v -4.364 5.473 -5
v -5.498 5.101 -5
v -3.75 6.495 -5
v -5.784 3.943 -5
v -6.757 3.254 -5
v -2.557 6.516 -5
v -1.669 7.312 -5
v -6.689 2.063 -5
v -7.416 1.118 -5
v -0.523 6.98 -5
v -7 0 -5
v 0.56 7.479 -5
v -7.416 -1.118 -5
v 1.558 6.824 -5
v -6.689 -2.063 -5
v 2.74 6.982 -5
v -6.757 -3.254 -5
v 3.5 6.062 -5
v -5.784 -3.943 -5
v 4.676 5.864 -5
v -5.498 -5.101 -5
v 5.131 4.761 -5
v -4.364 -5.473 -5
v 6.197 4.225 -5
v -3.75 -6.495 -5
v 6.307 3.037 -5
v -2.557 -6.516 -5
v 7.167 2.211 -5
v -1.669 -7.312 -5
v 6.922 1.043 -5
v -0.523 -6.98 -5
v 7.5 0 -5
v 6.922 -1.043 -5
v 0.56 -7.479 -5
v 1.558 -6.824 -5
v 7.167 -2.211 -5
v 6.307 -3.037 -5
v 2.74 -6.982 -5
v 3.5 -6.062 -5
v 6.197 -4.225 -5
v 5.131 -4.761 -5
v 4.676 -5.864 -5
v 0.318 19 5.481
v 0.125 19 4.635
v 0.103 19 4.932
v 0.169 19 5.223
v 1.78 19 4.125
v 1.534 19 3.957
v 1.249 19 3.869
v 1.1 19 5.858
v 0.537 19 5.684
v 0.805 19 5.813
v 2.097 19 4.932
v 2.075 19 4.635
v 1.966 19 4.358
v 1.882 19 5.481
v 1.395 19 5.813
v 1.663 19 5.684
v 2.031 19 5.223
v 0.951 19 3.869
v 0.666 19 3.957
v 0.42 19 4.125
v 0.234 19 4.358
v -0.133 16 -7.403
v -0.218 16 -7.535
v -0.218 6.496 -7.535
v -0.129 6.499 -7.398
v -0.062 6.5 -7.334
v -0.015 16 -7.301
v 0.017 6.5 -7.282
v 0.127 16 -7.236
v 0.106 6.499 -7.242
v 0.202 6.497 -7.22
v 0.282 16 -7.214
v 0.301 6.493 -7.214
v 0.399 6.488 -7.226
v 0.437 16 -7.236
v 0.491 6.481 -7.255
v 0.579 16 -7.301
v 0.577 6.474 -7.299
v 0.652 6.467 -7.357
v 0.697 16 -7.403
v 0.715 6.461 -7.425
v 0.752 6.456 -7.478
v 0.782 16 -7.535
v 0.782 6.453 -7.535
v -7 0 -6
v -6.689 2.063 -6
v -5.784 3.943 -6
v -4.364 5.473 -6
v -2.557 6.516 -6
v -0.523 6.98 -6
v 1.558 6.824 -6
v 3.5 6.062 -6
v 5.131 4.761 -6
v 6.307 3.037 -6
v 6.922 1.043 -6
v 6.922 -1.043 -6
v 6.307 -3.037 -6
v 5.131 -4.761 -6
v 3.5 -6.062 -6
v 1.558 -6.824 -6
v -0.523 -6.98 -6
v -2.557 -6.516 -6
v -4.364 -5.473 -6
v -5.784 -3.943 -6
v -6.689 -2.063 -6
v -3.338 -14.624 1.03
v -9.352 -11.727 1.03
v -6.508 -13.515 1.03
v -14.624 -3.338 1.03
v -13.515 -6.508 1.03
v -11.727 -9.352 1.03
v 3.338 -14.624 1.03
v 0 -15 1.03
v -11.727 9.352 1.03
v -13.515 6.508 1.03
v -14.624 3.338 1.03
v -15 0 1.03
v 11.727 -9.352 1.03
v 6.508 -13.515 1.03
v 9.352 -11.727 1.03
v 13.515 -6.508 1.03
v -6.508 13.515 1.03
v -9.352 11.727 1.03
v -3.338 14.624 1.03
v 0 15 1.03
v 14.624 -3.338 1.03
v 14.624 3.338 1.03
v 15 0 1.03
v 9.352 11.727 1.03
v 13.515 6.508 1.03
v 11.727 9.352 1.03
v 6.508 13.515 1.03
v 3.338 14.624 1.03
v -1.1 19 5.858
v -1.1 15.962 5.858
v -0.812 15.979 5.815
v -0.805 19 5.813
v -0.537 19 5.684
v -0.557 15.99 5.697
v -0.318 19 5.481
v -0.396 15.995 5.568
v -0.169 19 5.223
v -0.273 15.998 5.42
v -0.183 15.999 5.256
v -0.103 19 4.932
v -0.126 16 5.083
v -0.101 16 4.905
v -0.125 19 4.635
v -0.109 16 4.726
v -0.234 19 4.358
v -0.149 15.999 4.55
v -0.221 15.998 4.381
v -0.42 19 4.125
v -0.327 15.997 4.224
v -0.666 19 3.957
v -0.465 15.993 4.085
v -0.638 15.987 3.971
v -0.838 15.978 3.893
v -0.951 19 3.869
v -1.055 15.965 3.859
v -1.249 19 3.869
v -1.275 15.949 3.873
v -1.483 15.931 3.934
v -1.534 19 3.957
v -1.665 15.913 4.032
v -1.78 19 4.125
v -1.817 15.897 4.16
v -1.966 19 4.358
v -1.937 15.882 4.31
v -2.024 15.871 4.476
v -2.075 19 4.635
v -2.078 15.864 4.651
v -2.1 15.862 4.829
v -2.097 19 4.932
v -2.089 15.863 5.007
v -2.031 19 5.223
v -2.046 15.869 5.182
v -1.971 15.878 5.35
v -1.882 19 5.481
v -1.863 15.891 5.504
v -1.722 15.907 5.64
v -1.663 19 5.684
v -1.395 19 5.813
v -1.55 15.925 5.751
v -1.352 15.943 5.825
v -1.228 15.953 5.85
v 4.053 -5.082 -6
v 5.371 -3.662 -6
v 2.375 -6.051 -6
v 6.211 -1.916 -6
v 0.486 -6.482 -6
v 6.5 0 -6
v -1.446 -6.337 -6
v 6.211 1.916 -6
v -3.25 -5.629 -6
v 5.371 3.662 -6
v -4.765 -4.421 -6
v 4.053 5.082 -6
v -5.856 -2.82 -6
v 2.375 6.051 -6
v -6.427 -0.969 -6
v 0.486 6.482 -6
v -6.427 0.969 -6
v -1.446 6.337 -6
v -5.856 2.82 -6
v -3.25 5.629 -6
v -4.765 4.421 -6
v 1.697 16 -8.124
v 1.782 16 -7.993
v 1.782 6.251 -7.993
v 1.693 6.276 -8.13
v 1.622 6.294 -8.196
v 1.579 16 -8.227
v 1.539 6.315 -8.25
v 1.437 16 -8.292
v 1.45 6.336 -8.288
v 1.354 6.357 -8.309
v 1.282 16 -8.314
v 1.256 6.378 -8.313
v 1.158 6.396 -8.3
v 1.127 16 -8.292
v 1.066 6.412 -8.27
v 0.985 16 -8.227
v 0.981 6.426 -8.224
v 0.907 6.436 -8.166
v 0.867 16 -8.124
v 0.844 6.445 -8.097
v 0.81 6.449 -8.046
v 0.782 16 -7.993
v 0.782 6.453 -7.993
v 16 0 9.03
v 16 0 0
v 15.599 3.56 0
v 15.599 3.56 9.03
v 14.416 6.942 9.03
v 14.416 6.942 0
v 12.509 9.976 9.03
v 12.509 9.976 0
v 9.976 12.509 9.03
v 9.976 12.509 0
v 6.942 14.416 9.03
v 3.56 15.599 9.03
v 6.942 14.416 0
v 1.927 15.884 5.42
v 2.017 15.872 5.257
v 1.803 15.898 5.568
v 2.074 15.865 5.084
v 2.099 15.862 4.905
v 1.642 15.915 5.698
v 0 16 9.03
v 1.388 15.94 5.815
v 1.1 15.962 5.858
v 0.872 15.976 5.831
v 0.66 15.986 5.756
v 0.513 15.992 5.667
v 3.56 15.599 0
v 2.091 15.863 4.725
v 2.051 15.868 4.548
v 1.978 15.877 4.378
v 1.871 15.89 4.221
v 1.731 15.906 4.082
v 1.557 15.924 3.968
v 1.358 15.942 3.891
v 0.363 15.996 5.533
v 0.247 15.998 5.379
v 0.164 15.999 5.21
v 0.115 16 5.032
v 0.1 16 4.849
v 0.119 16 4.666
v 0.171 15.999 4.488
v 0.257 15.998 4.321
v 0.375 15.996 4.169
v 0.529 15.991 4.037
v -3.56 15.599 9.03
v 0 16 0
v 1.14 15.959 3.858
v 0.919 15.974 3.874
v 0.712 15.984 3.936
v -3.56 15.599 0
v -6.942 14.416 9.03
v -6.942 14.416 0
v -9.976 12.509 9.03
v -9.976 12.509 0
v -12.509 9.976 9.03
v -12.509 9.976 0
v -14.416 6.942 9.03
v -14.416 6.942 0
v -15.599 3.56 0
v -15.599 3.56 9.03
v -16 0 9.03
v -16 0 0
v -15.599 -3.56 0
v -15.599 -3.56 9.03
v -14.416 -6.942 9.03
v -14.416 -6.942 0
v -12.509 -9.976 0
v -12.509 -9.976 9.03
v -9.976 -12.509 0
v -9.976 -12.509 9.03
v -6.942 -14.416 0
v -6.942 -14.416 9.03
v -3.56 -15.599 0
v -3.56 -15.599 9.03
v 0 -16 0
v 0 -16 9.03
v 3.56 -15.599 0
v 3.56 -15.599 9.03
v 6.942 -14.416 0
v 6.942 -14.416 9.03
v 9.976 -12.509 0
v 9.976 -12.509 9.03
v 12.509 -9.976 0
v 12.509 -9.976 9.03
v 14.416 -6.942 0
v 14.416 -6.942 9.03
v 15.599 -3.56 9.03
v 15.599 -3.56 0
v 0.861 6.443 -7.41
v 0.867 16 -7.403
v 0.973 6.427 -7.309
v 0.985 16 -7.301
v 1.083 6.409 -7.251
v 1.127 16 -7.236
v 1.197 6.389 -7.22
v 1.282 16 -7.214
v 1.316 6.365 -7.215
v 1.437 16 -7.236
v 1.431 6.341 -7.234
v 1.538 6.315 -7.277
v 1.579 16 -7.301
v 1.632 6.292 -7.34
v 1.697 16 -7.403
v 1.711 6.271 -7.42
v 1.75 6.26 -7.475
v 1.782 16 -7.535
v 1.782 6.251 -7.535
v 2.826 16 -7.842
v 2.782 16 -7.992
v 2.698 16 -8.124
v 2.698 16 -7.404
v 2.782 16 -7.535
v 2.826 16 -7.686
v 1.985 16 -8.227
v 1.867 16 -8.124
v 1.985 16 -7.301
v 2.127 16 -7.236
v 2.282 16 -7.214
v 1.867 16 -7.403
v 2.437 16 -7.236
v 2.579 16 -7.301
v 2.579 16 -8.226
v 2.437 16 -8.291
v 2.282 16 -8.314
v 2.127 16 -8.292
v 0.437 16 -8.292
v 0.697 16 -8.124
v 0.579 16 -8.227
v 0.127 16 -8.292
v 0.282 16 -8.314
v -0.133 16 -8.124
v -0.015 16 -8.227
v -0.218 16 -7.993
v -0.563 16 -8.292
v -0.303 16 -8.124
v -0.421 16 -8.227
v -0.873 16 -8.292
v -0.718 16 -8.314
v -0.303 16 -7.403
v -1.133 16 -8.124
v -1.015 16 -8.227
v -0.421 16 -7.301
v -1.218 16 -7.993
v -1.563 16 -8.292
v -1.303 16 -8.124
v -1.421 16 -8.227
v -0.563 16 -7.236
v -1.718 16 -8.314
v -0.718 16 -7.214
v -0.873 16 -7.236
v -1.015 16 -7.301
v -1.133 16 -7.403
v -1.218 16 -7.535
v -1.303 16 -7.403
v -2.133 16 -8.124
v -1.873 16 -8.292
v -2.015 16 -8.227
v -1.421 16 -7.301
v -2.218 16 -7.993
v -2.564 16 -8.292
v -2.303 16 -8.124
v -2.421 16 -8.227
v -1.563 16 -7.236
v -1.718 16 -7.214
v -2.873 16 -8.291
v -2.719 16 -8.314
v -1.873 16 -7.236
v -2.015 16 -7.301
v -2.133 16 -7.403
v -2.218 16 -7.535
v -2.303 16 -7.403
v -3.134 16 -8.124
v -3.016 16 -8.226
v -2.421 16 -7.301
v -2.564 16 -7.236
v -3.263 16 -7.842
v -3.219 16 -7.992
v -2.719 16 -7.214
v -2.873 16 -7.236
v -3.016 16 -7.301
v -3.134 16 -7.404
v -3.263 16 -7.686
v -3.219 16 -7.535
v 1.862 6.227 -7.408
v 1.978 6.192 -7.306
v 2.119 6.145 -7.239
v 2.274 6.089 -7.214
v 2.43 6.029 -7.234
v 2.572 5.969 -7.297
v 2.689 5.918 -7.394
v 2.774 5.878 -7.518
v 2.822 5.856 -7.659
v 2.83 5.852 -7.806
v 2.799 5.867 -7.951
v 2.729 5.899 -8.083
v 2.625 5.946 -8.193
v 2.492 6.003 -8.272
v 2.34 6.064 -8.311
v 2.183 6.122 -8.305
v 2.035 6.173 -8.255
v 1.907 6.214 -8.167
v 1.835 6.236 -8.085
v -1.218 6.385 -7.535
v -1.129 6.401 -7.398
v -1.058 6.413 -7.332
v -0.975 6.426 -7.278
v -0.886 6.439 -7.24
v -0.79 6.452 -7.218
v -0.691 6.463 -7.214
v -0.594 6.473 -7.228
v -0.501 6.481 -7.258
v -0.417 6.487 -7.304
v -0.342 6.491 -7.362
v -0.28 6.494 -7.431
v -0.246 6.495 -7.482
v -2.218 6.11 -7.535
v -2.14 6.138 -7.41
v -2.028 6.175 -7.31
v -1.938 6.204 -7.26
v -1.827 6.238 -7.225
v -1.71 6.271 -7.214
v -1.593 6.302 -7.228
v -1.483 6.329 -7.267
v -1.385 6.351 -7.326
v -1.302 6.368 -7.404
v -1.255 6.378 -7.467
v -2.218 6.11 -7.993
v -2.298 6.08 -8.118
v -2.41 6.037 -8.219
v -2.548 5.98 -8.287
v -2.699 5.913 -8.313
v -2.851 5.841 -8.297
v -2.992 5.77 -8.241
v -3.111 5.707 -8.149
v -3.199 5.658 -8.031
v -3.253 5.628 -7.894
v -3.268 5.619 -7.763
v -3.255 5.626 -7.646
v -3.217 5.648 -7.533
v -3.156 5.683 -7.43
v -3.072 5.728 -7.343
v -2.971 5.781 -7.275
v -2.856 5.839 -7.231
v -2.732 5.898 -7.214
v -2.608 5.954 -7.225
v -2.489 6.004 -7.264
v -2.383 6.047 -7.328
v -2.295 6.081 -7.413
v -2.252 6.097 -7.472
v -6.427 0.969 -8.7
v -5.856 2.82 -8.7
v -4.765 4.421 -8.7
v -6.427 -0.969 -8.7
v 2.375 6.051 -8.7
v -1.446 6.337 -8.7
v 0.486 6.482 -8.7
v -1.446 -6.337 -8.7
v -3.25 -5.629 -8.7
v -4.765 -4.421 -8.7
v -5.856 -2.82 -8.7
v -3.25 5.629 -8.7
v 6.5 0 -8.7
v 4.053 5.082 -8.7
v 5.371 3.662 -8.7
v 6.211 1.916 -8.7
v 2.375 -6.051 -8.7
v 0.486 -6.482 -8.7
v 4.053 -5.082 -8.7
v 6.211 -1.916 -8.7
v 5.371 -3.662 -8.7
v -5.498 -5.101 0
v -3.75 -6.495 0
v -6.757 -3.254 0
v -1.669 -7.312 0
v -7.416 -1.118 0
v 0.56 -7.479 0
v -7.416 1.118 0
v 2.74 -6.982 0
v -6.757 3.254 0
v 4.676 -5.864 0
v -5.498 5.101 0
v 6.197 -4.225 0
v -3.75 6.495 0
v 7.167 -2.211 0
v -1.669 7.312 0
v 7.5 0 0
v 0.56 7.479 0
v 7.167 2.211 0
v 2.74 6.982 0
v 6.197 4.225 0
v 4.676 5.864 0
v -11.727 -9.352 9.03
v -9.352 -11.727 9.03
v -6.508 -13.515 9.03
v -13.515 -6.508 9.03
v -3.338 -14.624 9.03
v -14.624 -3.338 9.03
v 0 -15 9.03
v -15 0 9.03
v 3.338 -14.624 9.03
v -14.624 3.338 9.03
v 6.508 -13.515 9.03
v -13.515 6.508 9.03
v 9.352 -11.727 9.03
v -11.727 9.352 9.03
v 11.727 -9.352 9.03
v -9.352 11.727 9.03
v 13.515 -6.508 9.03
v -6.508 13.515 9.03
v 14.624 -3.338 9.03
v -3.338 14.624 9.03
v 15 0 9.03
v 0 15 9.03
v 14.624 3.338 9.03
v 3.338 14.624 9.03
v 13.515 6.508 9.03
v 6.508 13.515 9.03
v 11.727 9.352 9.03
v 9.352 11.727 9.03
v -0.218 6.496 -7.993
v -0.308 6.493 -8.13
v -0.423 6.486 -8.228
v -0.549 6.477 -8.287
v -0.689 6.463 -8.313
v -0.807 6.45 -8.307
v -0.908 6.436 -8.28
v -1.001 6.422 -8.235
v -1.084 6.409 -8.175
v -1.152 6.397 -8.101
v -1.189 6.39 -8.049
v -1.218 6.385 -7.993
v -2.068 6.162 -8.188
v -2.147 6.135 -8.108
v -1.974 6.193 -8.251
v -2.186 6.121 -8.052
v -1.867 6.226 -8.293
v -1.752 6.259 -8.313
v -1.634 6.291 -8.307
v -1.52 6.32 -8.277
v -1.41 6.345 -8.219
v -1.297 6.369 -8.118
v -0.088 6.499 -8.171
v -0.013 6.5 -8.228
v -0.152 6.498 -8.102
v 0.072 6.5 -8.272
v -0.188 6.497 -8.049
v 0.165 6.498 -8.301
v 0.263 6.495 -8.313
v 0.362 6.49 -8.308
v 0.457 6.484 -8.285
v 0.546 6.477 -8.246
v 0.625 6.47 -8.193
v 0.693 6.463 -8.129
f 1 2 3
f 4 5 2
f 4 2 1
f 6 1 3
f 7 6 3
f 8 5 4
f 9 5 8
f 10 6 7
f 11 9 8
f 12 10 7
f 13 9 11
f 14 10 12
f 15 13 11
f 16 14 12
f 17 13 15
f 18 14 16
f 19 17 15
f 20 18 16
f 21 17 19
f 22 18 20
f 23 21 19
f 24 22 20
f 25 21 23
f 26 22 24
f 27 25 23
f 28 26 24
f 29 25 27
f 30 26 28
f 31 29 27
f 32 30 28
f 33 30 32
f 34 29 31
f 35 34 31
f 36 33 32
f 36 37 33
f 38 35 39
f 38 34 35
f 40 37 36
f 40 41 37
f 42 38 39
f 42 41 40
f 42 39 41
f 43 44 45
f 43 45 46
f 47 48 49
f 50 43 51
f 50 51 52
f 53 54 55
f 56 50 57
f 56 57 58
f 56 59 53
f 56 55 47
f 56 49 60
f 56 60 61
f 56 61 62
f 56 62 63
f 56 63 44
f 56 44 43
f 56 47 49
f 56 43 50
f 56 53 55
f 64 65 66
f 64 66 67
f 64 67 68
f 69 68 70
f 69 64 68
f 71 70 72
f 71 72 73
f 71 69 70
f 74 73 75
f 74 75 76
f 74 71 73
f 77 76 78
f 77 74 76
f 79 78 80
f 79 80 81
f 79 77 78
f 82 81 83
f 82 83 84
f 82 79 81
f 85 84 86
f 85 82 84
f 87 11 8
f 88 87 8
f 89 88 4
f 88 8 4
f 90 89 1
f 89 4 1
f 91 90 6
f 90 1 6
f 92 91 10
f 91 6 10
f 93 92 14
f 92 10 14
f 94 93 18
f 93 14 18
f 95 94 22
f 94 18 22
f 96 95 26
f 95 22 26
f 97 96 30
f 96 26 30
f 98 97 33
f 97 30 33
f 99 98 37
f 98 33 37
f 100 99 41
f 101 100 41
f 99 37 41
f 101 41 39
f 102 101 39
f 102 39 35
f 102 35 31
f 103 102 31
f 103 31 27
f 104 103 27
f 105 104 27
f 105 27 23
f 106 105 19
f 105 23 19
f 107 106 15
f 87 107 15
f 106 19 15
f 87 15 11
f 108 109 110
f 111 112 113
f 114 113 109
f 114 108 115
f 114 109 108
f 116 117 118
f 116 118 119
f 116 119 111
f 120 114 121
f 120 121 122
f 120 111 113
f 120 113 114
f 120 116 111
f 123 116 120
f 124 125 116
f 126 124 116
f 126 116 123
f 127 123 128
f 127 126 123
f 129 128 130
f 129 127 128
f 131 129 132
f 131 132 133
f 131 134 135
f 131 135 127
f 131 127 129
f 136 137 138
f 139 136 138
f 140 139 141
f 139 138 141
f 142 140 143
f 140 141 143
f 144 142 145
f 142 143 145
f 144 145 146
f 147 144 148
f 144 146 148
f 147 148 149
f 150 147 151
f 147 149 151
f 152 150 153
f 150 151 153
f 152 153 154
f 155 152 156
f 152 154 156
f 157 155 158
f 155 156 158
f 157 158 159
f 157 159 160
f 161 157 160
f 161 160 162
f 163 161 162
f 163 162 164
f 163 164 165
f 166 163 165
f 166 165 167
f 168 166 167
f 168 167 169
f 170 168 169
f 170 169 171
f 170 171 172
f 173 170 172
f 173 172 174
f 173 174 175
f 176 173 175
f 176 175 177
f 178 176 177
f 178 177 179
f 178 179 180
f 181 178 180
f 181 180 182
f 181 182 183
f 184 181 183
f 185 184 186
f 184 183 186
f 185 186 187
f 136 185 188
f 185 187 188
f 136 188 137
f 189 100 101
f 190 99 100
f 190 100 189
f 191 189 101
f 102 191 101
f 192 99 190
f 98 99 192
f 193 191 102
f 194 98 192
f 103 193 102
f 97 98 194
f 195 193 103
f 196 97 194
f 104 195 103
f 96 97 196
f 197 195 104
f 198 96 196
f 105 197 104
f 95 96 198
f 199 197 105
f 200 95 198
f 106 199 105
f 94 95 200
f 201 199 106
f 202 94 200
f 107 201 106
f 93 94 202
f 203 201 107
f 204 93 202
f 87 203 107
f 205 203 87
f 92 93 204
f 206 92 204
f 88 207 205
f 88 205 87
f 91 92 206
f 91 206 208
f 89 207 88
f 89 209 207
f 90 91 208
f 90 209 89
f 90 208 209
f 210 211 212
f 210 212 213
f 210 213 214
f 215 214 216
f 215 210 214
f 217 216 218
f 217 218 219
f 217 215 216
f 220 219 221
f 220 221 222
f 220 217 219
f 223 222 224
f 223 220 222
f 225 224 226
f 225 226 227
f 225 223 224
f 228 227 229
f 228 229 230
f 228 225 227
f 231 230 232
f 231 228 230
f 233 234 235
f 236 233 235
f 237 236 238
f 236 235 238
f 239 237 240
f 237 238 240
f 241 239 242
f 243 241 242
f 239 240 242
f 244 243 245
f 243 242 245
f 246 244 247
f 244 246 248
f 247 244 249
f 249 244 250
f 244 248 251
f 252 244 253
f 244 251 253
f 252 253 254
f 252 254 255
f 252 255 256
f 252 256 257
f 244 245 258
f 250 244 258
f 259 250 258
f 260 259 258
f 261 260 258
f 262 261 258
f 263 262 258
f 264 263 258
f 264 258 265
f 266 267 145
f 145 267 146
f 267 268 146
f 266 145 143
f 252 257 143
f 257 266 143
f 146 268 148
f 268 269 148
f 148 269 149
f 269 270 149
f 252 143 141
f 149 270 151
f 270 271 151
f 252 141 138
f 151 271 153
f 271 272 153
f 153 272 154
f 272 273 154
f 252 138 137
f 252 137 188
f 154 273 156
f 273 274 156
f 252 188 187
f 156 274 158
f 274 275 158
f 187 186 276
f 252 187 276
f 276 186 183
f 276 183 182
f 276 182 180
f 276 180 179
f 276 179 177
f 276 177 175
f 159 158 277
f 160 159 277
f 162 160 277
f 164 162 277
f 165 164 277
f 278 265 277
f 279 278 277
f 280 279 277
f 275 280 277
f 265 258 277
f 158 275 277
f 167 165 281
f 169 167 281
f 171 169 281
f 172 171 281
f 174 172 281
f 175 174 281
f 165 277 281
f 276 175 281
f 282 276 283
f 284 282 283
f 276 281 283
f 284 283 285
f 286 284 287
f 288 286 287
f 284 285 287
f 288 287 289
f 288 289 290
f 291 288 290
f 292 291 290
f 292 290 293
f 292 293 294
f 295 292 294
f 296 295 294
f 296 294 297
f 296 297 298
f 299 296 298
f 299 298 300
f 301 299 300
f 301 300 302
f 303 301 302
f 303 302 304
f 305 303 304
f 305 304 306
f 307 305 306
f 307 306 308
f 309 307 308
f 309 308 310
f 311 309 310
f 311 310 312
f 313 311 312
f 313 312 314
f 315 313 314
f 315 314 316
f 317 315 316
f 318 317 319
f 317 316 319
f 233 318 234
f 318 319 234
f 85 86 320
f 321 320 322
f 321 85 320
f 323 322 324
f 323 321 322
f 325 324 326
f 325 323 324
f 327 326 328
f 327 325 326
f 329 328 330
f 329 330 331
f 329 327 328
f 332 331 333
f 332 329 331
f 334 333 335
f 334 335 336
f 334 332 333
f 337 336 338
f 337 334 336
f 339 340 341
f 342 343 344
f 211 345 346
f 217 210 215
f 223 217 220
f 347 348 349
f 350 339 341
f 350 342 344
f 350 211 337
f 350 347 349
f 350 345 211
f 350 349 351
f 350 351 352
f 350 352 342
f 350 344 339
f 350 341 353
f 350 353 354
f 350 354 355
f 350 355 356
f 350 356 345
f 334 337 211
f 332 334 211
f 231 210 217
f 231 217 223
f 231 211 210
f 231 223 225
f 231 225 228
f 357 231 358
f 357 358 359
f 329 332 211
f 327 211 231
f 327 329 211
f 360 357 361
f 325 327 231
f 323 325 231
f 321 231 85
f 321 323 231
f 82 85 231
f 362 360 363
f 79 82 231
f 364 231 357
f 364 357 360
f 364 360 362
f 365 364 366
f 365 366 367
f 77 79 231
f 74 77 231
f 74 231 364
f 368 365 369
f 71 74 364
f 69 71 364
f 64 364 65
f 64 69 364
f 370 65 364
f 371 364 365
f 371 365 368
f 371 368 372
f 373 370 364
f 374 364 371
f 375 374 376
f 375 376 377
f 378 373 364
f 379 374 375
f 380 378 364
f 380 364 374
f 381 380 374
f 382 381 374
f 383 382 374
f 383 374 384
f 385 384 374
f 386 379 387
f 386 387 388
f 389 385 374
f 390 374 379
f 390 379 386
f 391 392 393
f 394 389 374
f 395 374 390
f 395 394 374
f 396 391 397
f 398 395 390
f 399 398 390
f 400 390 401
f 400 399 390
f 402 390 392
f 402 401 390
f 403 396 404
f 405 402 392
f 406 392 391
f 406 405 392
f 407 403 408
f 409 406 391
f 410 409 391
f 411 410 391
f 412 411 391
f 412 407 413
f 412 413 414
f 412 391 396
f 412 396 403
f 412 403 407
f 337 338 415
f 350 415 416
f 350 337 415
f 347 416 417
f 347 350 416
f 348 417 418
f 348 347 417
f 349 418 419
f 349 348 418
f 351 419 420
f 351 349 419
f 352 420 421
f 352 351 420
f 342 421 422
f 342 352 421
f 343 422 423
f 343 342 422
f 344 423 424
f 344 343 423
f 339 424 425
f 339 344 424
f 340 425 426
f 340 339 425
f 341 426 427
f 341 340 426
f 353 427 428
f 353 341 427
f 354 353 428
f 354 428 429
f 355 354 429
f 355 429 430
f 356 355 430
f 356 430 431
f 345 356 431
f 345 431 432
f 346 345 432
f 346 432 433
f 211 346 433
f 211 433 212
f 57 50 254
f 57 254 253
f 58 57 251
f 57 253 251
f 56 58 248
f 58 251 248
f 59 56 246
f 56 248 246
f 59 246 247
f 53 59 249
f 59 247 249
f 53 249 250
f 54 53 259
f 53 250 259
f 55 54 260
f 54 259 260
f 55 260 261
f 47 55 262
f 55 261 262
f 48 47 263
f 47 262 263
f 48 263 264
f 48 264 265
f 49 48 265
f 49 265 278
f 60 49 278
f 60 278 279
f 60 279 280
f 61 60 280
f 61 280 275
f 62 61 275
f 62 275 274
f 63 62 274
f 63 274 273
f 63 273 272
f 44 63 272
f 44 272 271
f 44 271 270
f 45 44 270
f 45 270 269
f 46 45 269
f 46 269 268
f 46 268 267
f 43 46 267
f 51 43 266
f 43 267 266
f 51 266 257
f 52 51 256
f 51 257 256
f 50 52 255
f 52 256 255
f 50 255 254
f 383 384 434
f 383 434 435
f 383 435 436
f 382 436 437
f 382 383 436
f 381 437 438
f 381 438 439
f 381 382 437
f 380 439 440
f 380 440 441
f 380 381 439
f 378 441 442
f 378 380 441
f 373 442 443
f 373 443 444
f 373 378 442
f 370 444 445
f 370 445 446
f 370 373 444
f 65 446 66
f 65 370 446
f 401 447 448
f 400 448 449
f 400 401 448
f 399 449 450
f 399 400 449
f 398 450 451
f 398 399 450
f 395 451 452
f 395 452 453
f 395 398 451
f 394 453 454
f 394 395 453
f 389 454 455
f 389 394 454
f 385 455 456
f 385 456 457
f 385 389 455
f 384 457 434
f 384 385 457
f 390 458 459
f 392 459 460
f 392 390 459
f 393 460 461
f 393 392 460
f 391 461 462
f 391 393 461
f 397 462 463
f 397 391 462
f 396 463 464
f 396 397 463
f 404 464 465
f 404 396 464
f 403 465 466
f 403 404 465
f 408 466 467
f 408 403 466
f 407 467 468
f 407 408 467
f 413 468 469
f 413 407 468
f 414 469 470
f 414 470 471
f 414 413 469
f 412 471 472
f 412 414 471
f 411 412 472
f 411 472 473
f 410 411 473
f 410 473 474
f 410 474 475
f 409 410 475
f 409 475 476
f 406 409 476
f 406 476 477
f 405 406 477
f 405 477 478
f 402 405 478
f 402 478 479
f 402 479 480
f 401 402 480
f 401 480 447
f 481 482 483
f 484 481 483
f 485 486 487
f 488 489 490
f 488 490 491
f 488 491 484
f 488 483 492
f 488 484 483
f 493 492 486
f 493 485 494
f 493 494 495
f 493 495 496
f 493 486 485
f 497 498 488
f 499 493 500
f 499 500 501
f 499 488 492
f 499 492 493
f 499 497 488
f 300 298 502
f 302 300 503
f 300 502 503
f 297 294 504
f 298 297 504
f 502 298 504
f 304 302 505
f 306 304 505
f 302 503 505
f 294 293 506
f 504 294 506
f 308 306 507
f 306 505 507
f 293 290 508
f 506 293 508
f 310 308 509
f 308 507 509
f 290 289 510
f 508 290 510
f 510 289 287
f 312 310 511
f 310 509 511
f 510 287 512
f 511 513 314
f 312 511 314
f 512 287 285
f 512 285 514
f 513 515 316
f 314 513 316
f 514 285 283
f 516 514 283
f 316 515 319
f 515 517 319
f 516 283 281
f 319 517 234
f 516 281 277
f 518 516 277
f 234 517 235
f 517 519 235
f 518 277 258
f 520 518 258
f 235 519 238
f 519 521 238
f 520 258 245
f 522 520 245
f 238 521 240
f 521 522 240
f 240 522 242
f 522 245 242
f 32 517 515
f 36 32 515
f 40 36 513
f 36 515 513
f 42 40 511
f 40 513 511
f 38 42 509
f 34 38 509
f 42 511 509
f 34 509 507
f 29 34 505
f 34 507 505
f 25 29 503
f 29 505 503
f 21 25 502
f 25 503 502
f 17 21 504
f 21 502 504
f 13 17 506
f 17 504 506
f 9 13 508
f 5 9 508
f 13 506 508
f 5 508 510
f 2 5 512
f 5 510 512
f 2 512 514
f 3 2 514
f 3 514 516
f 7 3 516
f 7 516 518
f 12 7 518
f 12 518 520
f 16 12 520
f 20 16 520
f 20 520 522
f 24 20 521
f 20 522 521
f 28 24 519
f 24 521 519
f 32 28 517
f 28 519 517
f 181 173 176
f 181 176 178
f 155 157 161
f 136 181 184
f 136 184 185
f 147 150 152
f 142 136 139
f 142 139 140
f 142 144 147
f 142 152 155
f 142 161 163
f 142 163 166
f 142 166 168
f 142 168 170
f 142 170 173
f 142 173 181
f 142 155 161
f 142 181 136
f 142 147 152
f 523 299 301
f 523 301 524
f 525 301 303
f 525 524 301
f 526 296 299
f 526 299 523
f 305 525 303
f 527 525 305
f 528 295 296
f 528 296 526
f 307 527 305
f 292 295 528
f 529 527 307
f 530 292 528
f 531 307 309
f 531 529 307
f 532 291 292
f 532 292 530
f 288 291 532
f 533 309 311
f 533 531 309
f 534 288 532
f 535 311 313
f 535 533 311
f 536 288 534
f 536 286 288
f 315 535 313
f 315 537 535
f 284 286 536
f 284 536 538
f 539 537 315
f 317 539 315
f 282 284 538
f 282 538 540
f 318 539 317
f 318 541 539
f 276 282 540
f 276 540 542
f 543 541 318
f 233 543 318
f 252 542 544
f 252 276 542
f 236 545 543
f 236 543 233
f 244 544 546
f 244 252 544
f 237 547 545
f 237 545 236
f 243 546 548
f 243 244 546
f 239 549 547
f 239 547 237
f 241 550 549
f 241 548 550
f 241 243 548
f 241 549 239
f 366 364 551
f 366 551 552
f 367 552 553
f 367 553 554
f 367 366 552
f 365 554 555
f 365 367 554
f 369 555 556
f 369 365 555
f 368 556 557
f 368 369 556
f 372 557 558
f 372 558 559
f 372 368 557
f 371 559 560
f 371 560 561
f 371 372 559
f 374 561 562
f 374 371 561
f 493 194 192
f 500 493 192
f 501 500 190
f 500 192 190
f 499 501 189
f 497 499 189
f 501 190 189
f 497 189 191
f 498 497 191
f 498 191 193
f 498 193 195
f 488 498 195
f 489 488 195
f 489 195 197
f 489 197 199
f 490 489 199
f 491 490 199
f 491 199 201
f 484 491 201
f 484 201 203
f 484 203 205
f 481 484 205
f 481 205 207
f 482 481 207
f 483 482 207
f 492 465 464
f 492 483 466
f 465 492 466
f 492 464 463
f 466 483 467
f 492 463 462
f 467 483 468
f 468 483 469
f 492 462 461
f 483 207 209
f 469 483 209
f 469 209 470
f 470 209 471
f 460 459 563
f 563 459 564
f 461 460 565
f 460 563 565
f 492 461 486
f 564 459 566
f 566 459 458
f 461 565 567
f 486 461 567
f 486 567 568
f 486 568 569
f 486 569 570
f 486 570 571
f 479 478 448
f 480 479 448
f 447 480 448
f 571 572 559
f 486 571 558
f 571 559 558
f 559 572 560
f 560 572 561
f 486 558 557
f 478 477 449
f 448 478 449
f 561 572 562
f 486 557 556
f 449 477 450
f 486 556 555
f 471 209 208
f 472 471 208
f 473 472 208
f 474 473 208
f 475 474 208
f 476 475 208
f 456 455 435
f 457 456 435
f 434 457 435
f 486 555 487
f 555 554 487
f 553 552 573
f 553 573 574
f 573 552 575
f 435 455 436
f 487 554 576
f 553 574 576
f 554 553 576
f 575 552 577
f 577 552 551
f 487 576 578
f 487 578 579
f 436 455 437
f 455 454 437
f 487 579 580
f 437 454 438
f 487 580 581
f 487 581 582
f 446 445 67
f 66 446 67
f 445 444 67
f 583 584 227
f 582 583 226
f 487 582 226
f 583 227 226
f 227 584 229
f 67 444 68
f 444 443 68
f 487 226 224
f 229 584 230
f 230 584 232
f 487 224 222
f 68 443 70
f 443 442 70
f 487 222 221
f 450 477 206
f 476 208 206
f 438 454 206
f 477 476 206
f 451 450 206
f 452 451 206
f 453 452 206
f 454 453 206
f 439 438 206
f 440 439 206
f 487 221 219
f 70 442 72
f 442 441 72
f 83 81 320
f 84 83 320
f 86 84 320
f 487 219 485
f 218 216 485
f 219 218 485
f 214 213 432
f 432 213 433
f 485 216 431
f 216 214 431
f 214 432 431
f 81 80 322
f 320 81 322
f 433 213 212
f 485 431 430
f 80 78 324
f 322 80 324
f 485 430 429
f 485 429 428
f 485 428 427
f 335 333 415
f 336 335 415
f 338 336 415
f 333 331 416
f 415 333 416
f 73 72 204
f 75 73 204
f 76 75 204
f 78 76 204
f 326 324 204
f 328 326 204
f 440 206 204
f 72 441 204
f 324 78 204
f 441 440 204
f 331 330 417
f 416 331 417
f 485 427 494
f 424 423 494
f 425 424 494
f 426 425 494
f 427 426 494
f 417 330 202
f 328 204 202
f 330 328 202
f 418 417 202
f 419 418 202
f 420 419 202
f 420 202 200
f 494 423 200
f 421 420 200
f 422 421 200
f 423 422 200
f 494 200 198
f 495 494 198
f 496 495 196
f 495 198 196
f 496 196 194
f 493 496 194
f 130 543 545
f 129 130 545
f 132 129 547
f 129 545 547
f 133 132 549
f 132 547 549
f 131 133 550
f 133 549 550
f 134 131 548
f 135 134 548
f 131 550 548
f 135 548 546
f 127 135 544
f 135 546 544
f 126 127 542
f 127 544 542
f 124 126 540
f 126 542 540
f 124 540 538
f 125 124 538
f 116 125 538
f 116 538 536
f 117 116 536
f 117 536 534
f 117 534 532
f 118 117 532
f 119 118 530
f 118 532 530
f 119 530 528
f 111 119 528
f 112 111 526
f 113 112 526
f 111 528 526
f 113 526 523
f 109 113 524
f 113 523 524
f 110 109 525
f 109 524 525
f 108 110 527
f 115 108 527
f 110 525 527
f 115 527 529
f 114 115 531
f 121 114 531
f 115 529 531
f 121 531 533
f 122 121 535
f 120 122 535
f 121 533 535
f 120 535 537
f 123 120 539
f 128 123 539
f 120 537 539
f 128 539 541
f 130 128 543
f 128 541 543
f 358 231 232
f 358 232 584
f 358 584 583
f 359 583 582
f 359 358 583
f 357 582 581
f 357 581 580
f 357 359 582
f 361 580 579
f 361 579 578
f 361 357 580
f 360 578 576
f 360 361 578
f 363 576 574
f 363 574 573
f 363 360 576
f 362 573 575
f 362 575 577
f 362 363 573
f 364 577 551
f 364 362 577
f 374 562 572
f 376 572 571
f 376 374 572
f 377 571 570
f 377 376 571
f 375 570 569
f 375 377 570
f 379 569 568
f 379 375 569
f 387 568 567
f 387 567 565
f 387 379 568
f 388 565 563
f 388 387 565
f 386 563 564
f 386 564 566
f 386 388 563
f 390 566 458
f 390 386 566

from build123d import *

# Parameters (mm, degrees)
ESQUISSE1_R             = 16
BOSS_EXTRU_1_DEPTH      = 9.03
ESQUISSE2_R             = 15
ENL_V_MAT_EXTRU_1_DEPTH = 8
ESQUISSE3_R             = 7.5
BOSS_EXTRU_2_DEPTH      = 5
ESQUISSE4_R             = 7
BOSS_EXTRU_3_DEPTH      = 1
ESQUISSE5_R             = 6.5
BOSS_EXTRU_4_DEPTH      = 2.7
BOSS_EXTRU_5_DEPTH      = 3
BOSS_EXTRU_5_DEPTH_BACK = 0.5
ESQUISSE6_R             = 1
BOSS_EXTRU_9_DEPTH      = 12


with BuildPart() as part:
    # Esquisse1 → Boss.-Extru.1 (new body)
    with BuildSketch(Plane.XY):
        Circle(ESQUISSE1_R)
    extrude(amount=BOSS_EXTRU_1_DEPTH)

    # Esquisse2 → Enlèv. mat.-Extru.1 (cut)
    with BuildSketch(Plane.XY.offset(9.03)):
        Circle(ESQUISSE2_R)
    extrude(amount=-ENL_V_MAT_EXTRU_1_DEPTH, mode=Mode.SUBTRACT)

    # Esquisse3 → Boss.-Extru.2 (add)
    with BuildSketch(Plane(origin=(0, 0, 0), x_dir=(-1, 0, 0), z_dir=(0, 0, -1))):
        with Locations(Location((0, 0, 0), (0, 0, 180))):
            Circle(ESQUISSE3_R)
    extrude(amount=BOSS_EXTRU_2_DEPTH)

    # Esquisse4 → Boss.-Extru.3 (add)
    with BuildSketch(Plane(origin=(0, 0, -5), x_dir=(-1, 0, 0), z_dir=(0, 0, -1))):
        Circle(ESQUISSE4_R)
    extrude(amount=BOSS_EXTRU_3_DEPTH)

    # Esquisse5 → Boss.-Extru.4 (add)
    with BuildSketch(Plane(origin=(0, 0, -6), x_dir=(-1, 0, 0), z_dir=(0, 0, -1))):
        with Locations(Location((0, 0, 0), (0, 0, 180))):
            Circle(ESQUISSE5_R)
    extrude(amount=BOSS_EXTRU_4_DEPTH)

    # Esquisse6 → Boss.-Extru.5 (add, two sides: drawn at the far end of the back side and taken through both)
    with BuildSketch(Plane(origin=(0, 16, 0), x_dir=(-1, 0, 0), z_dir=(0, 1, 0)).offset(-BOSS_EXTRU_5_DEPTH_BACK)):
        with Locations(Location((1.1, 4.857681609, 0), (0, 0, 90))):
            Circle(ESQUISSE6_R)
        with Locations(Location((-1.1, 4.857681609, 0), (0, 0, 90))):
            Circle(ESQUISSE6_R)
    extrude(amount=BOSS_EXTRU_5_DEPTH + BOSS_EXTRU_5_DEPTH_BACK)

    # Esquisse7 → Boss.-Extru.9 (add)
    with BuildSketch(Plane(origin=(0, 16, 0), x_dir=(-1, 0, 0), z_dir=(0, 1, 0))):
        with BuildLine():
            ThreePointArc((2.218175405, -7.992904998), (3.268175405, -7.763776214), (2.218175405, -7.534647429))
            ThreePointArc((2.218175405, -7.534647429), (1.718175405, -7.213776214), (1.218175405, -7.534647429))
            ThreePointArc((1.218175405, -7.534647429), (0.718175405, -7.213776214), (0.218175405, -7.534647429))
            ThreePointArc((0.218175405, -7.534647429), (-0.281824595, -7.213776214), (-0.781824595, -7.534647429))
            ThreePointArc((-0.781824595, -7.534647429), (-1.281824595, -7.213776214), (-1.781824595, -7.534647429))
            ThreePointArc((-1.781824595, -7.534647429), (-2.831824595, -7.763776214), (-1.781824595, -7.992904998))
            ThreePointArc((-1.781824595, -7.992904998), (-1.281824595, -8.313776214), (-0.781824595, -7.992904998))
            ThreePointArc((-0.781824595, -7.992904998), (-0.281824595, -8.313776214), (0.218175405, -7.992904998))
            ThreePointArc((0.218175405, -7.992904998), (0.718175405, -8.313776214), (1.218175405, -7.992904998))
            ThreePointArc((1.218175405, -7.992904998), (1.718175405, -8.313776214), (2.218175405, -7.992904998))
        make_face()
    extrude(amount=-BOSS_EXTRU_9_DEPTH)


solid = part.part
